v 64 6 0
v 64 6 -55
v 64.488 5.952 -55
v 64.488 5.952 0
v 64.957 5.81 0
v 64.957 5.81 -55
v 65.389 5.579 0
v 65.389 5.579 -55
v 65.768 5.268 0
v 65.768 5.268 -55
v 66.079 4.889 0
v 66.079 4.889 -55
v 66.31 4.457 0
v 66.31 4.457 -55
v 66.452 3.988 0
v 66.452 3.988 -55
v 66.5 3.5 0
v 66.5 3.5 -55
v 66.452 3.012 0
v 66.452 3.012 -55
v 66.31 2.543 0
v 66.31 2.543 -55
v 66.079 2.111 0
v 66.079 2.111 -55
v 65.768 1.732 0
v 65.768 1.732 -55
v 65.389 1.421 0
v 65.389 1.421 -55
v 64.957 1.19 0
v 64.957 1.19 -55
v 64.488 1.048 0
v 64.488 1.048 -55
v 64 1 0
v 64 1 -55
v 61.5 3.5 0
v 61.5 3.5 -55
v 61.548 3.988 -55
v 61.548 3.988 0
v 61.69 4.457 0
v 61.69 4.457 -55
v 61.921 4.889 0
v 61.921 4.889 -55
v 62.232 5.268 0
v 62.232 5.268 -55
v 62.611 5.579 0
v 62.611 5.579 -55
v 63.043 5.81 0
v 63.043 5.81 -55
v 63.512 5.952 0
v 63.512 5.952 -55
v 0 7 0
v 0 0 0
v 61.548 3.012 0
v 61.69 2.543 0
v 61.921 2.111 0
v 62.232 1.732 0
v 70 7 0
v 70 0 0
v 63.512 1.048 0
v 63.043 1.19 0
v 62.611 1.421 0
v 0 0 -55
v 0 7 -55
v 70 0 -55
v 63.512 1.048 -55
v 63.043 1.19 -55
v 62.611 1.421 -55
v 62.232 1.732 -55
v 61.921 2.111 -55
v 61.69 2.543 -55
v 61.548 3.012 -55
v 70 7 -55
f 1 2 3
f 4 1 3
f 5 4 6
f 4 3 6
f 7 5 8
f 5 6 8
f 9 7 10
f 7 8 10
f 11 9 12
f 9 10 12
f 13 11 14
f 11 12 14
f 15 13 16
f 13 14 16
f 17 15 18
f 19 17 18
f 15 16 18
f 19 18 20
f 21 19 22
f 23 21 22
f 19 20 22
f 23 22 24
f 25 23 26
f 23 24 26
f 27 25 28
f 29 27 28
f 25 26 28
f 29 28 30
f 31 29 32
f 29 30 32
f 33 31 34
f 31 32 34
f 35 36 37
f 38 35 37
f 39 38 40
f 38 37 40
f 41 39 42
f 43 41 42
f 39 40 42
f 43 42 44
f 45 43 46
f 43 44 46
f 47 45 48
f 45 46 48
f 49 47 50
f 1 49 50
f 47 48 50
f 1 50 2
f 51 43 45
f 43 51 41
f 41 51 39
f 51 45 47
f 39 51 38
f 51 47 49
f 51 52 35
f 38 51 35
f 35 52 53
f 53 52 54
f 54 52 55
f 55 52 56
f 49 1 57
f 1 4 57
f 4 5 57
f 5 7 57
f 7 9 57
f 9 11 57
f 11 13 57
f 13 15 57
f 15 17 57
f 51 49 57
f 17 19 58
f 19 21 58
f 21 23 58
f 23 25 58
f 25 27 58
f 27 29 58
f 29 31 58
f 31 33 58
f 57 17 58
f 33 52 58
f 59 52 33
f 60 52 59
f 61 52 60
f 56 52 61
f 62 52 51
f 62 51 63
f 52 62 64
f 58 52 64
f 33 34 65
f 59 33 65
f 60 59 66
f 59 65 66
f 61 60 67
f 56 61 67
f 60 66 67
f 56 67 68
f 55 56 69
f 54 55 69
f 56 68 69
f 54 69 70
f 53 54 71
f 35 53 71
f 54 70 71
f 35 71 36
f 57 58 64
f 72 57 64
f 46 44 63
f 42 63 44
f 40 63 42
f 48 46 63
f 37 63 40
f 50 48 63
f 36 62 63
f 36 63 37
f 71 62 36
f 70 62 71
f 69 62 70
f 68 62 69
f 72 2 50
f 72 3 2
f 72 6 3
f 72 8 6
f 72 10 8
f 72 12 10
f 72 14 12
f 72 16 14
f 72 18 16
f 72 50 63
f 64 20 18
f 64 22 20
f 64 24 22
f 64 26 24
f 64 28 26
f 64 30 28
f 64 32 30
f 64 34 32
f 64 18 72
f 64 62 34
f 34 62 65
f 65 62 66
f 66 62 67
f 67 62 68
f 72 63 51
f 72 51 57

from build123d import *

# Parameters (mm, degrees)
SKETCH1_W           = 70
SKETCH1_H           = 55
BOSS_EXTRUDE1_DEPTH = 7
CUT_EXTRUDE1_DEPTH  = 100


with BuildPart() as part:
    # Sketch1 → Boss-Extrude1 (new body)
    with BuildSketch(Plane(origin=(0, 0, 0), x_dir=(1, 0, 0), z_dir=(0, 1, 0))):
        with Locations((35, 27.5)):
            Rectangle(SKETCH1_W, SKETCH1_H)
    extrude(amount=BOSS_EXTRUDE1_DEPTH)

    # Sketch2 → Cut-Extrude1 (cut)
    with BuildSketch(Plane(origin=(0, 0, -55), x_dir=(-1, 0, 0), z_dir=(0, 0, -1))):
        with BuildLine():
            ThreePointArc((-61.5, 3.5), (-62.232233047, 5.267766953), (-64, 6))
            Line((-64, 6), (-64, 1))
            ThreePointArc((-64, 1), (-62.232233047, 1.732233047), (-61.5, 3.5))
        make_face()
        with BuildLine():
            Line((-64, 1), (-64, 6))
            ThreePointArc((-64, 6), (-66.5, 3.5), (-64, 1))
        make_face()
    extrude(amount=-CUT_EXTRUDE1_DEPTH, mode=Mode.SUBTRACT)


solid = part.part
